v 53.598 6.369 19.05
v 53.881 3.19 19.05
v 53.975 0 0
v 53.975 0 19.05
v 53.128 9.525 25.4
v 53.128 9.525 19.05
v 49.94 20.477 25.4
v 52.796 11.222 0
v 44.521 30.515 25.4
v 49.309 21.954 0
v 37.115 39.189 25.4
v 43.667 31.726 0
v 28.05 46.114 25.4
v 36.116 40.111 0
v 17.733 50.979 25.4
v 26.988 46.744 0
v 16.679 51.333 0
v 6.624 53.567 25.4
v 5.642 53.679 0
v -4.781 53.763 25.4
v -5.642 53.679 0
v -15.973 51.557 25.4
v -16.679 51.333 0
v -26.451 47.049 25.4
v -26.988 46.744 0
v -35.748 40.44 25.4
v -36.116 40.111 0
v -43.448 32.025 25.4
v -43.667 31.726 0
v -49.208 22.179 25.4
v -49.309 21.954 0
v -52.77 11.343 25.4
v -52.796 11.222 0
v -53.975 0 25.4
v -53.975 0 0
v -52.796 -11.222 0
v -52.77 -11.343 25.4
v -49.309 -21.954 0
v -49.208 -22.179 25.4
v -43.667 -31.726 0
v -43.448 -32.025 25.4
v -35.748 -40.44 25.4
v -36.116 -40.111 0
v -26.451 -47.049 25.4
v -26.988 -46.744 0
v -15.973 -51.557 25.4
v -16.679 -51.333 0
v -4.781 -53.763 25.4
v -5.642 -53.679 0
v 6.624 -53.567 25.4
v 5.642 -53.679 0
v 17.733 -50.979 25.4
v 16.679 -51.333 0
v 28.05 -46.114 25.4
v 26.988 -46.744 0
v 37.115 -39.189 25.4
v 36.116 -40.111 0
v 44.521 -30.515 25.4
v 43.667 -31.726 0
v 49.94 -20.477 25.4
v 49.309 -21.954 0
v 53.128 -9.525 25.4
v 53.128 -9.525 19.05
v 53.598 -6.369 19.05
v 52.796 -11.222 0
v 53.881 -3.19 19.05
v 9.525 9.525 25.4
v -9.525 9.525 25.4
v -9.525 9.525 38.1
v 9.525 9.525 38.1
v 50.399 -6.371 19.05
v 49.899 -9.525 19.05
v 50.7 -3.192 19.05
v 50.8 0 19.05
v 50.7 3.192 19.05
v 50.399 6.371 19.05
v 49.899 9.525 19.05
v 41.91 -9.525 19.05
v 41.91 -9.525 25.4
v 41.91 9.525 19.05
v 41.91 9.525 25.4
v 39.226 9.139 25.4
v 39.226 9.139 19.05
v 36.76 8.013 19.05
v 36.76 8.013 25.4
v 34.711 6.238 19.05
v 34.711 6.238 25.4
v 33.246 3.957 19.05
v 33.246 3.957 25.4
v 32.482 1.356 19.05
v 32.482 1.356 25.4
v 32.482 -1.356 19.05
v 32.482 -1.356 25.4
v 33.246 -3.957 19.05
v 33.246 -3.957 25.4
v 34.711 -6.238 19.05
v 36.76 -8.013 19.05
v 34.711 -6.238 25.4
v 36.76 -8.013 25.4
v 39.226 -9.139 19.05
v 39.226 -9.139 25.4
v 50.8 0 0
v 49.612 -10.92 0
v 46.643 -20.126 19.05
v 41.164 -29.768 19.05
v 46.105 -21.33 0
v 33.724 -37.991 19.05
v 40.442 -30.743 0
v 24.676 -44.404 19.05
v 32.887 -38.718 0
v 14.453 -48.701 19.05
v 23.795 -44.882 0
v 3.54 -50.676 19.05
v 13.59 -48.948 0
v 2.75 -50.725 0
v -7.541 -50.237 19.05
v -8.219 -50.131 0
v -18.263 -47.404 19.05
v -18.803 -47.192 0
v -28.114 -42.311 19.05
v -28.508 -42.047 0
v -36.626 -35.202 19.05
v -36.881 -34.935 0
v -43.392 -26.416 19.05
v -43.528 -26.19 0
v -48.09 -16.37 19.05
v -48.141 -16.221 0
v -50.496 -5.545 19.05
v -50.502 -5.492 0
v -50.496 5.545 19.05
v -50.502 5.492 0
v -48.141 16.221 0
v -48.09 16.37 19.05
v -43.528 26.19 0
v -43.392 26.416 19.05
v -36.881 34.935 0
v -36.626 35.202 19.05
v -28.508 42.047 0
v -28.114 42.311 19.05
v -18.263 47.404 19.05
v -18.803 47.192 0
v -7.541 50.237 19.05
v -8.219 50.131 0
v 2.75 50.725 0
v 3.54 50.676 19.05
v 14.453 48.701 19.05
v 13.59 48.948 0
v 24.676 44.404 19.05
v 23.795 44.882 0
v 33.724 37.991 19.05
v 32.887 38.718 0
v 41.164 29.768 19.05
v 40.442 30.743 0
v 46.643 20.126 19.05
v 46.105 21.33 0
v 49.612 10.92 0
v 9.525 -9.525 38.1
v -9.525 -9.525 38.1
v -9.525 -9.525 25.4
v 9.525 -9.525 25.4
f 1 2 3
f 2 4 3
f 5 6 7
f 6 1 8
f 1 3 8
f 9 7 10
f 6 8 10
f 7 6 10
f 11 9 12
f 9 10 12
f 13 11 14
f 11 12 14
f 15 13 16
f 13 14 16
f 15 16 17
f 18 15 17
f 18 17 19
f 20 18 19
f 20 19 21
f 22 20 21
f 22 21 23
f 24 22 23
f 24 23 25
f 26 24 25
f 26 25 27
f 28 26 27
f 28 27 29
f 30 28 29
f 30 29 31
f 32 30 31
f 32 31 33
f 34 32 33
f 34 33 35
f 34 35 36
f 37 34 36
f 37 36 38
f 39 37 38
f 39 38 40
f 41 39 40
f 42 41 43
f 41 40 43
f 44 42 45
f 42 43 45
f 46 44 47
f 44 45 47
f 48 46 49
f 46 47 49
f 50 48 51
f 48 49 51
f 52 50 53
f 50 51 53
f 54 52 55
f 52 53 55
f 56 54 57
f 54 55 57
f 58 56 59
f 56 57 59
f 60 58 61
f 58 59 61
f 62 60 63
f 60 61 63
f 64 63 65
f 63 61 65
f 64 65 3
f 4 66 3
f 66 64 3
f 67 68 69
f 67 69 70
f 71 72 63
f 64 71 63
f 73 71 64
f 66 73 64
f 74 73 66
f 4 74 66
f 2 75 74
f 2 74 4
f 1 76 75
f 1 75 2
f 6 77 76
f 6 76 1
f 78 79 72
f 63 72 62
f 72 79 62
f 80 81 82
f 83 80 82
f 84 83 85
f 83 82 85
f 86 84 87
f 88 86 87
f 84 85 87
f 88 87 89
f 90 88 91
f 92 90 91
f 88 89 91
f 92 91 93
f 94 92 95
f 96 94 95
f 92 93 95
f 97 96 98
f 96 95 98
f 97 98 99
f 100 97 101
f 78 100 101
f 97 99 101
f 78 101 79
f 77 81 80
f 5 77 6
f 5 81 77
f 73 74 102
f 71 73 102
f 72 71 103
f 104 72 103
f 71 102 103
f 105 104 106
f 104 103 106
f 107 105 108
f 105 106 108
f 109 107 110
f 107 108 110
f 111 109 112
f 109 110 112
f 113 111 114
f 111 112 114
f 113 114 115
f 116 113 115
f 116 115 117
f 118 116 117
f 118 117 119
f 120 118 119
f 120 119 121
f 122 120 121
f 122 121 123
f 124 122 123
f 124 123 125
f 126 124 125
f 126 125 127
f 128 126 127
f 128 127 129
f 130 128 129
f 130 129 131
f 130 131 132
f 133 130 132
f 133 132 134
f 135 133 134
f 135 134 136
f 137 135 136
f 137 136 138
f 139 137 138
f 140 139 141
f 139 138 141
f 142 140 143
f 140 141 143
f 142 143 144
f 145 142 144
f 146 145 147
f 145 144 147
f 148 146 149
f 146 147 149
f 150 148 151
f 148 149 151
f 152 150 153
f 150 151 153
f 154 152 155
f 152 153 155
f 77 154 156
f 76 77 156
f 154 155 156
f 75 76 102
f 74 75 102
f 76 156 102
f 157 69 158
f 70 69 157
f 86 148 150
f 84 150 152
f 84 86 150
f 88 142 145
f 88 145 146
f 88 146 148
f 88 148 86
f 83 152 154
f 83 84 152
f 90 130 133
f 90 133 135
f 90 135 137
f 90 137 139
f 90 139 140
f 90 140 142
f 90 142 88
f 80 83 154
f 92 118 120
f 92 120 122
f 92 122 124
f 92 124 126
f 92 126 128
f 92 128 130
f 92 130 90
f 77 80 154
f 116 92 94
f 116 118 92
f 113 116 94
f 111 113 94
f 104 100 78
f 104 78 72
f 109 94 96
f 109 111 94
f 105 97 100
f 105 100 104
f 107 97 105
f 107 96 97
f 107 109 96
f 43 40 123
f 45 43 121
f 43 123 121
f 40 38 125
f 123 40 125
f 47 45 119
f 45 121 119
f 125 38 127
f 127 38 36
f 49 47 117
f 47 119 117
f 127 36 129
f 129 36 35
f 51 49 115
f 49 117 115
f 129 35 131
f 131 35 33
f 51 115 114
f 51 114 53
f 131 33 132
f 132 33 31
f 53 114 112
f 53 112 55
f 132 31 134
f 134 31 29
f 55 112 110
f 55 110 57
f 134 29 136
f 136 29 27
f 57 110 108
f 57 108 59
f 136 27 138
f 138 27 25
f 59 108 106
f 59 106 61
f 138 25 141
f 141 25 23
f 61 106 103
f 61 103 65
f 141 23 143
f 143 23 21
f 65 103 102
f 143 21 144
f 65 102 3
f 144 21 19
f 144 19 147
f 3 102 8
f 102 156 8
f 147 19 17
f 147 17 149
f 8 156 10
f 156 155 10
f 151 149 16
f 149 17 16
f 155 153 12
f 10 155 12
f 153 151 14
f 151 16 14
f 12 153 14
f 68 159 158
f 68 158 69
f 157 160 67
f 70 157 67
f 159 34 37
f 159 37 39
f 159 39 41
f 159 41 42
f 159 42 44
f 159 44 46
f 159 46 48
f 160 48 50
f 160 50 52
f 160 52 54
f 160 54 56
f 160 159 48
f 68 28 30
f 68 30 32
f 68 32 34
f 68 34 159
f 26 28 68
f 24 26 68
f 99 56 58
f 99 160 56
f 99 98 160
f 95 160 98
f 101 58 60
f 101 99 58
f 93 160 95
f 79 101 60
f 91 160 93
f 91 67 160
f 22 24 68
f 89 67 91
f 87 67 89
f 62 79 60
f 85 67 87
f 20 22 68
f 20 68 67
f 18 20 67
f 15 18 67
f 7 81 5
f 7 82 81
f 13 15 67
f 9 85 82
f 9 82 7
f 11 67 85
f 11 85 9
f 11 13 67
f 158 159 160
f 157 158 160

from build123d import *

# Parameters (mm, degrees)
F0_R     = 53.975
F1_DEPTH = 25.4
F2_R     = 50.8
F3_DEPTH = 19.05
F4_W     = 19.05
F4_H     = 19.05
F5_DEPTH = 12.7
F6_R     = 9.525
F7_DEPTH = 6.35
F8_W     = 17.119241
F8_H     = 19.05
F9_DEPTH = 6.35


with BuildPart() as f1:
    # F0 (on Top) → F1 (new body)
    with BuildSketch(Plane.XY):
        Circle(F0_R)
    extrude(amount=F1_DEPTH)

    # F2 (on face) → F3 (cut)
    with BuildSketch(Plane(origin=(0, 0, 0), x_dir=(1, 0, 0), z_dir=(0, 0, -1))):
        Circle(F2_R)
    extrude(amount=-F3_DEPTH, mode=Mode.SUBTRACT)

    # F4 (on face) → F5 (join)
    with BuildSketch(Plane.XY.offset(25.4)):
        Rectangle(F4_W, F4_H)
    extrude(amount=F5_DEPTH)

    # F6 (on face) → F7 (cut, through all)
    with BuildSketch(Plane.XY.offset(25.4)):
        with Locations((41.91, 0)):
            Circle(F6_R)
    extrude(amount=-F7_DEPTH, mode=Mode.SUBTRACT)

    # F8 (on face) → F9 (cut, through all)
    with BuildSketch(Plane.XY.offset(25.4)):
        with Locations((50.46962, 0)):
            Rectangle(F8_W, F8_H)
    extrude(amount=-F9_DEPTH, mode=Mode.SUBTRACT)


solid = f1.part
